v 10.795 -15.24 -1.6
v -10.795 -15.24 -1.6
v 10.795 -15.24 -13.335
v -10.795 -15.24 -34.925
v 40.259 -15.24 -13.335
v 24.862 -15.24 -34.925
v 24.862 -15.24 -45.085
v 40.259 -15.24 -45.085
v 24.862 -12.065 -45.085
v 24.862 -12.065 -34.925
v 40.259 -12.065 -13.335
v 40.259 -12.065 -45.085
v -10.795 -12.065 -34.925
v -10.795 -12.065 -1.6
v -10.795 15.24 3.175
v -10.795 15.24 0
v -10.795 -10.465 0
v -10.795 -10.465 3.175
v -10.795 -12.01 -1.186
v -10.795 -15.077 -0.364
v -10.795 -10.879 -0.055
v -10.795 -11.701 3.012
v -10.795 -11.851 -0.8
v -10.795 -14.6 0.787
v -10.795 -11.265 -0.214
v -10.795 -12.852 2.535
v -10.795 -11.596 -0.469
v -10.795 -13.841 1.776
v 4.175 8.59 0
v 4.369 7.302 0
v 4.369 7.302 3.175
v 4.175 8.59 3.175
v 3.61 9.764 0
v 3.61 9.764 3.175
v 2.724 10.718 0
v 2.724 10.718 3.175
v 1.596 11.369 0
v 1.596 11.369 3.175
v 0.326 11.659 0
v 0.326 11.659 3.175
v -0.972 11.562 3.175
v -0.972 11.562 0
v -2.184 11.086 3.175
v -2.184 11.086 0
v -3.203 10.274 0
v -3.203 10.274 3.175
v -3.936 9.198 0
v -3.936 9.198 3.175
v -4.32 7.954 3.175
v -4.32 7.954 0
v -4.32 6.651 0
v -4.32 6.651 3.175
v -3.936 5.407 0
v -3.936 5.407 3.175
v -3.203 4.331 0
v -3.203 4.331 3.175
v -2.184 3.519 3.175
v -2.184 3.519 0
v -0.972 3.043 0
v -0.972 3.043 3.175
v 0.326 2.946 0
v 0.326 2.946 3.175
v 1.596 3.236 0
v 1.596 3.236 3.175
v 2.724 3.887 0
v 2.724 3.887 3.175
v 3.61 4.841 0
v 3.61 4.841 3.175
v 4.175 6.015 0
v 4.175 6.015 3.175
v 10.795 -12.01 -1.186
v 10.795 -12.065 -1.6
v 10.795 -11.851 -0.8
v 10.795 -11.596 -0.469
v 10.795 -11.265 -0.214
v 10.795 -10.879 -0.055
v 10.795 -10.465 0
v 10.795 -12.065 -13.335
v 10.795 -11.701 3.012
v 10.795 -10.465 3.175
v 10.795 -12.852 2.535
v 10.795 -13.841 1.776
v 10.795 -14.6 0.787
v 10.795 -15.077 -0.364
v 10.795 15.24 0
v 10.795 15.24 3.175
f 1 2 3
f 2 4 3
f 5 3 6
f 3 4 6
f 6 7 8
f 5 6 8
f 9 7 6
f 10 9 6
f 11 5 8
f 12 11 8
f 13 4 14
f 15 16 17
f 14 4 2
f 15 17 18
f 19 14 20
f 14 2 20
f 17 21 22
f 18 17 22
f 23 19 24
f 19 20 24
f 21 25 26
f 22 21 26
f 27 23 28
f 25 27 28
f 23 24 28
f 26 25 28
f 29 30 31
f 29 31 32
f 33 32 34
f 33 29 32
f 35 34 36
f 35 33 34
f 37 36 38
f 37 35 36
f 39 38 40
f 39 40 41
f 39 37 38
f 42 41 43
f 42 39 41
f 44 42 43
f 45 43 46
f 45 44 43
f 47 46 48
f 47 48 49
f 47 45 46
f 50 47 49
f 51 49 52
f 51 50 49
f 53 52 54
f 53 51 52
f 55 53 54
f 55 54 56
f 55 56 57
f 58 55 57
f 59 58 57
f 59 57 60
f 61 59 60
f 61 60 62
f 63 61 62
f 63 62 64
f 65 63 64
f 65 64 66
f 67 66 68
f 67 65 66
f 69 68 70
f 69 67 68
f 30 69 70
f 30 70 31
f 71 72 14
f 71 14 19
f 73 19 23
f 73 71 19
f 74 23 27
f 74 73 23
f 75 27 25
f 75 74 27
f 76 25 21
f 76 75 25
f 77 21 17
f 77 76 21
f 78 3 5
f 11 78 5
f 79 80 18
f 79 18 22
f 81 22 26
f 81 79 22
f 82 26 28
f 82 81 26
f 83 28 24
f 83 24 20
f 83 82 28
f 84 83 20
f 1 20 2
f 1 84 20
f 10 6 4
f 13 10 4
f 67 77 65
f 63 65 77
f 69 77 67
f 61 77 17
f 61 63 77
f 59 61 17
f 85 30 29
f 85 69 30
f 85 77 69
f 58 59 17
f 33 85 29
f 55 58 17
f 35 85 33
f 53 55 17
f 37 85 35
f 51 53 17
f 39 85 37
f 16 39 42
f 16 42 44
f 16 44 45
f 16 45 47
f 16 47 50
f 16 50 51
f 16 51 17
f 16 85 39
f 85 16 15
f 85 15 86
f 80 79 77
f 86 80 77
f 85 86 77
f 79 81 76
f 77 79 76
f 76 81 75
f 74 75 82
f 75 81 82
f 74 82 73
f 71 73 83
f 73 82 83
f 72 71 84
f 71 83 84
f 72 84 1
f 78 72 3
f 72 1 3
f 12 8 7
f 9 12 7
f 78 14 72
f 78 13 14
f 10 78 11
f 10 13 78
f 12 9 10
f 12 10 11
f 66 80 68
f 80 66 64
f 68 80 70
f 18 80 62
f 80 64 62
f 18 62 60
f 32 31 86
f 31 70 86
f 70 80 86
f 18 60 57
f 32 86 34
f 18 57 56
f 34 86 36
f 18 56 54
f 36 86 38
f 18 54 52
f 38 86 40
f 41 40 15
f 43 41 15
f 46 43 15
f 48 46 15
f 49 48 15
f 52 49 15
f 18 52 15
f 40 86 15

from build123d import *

# Parameters (mm, degrees)
SKETCH1_R                    = 4.3688
BOSS_EXTRUDE1_DEPTH          = 3.175
EDGE_FLANGE1_STRIP_W         = 15.900000204
EDGE_FLANGE1_STRIP_H         = 3.175
EDGE_FLANGE1_STRIP_CUT_DEPTH = 21.59
EDGE_FLANGE1_DEPTH           = 21.59
EDGE_FLANGE1_FLAT_DEPTH      = 3.175


# Sheet-metal steps are written as plain solids
with BuildPart() as part:
    # Sketch1 → Boss-Extrude1 (new body)
    with BuildSketch(Plane.XY):
        Polygon((-10.795, 15.24), (10.795, 15.24), (10.795, -15.24), (-10.795, -15.24), (-10.795, -1.27), align=None)
        with Locations((0, 7.3025)):
            Circle(SKETCH1_R, mode=Mode.SUBTRACT)
    extrude(amount=BOSS_EXTRUDE1_DEPTH)

    # Edge-Flange1 strip (across the edge) → Edge-Flange1 strip cut (cut)
    with BuildSketch(Plane(origin=(10.795, -15.24, 0), x_dir=(0, 1, 0), z_dir=(-1, 0, 0))):
        with Locations((-3.175, -1.5875)):
            Rectangle(EDGE_FLANGE1_STRIP_W, EDGE_FLANGE1_STRIP_H)
    extrude(amount=EDGE_FLANGE1_STRIP_CUT_DEPTH, mode=Mode.SUBTRACT)

    # Edge-Flange1 bend section (across the edge) → Edge-Flange1 (add)
    with BuildSketch(Plane(origin=(10.795, -15.24, 0), x_dir=(0, 1, 0), z_dir=(-1, 0, 0))):
        with BuildLine():
            Line((0, 1.600000102), (3.175, 1.600000102))
            ThreePointArc((3.175, 1.600000102), (3.64362918, 0.46862918), (4.775000102, 0))
            Line((4.775000102, 0), (4.775000102, -3.175))
            ThreePointArc((4.775000102, -3.175), (1.39856515, -1.77643485), (0, 1.600000102))
        make_face()
    extrude(amount=EDGE_FLANGE1_DEPTH)

    # Edge-Flange1 profile (on flange) → Edge-Flange1 flat (add)
    with BuildSketch(Plane(origin=(0, -15.24, 0), x_dir=(1, 0, 0), z_dir=(0, 1, 0))):
        Polygon((-10.795, 1.600000102), (10.795, 1.600000102), (10.795, 13.335), (33.655, 13.335), (38.735, 13.335), (40.259, 13.335), (40.259, 45.085), (38.735, 45.085), (26.386399264, 45.085), (24.862399264, 45.085), (24.862399264, 34.925), (21.306399264, 34.925), (16.226399264, 34.925), (10.795, 34.925), (-10.795, 34.925), (-10.795, 13.335), align=None)
    extrude(amount=EDGE_FLANGE1_FLAT_DEPTH)


solid = part.part
